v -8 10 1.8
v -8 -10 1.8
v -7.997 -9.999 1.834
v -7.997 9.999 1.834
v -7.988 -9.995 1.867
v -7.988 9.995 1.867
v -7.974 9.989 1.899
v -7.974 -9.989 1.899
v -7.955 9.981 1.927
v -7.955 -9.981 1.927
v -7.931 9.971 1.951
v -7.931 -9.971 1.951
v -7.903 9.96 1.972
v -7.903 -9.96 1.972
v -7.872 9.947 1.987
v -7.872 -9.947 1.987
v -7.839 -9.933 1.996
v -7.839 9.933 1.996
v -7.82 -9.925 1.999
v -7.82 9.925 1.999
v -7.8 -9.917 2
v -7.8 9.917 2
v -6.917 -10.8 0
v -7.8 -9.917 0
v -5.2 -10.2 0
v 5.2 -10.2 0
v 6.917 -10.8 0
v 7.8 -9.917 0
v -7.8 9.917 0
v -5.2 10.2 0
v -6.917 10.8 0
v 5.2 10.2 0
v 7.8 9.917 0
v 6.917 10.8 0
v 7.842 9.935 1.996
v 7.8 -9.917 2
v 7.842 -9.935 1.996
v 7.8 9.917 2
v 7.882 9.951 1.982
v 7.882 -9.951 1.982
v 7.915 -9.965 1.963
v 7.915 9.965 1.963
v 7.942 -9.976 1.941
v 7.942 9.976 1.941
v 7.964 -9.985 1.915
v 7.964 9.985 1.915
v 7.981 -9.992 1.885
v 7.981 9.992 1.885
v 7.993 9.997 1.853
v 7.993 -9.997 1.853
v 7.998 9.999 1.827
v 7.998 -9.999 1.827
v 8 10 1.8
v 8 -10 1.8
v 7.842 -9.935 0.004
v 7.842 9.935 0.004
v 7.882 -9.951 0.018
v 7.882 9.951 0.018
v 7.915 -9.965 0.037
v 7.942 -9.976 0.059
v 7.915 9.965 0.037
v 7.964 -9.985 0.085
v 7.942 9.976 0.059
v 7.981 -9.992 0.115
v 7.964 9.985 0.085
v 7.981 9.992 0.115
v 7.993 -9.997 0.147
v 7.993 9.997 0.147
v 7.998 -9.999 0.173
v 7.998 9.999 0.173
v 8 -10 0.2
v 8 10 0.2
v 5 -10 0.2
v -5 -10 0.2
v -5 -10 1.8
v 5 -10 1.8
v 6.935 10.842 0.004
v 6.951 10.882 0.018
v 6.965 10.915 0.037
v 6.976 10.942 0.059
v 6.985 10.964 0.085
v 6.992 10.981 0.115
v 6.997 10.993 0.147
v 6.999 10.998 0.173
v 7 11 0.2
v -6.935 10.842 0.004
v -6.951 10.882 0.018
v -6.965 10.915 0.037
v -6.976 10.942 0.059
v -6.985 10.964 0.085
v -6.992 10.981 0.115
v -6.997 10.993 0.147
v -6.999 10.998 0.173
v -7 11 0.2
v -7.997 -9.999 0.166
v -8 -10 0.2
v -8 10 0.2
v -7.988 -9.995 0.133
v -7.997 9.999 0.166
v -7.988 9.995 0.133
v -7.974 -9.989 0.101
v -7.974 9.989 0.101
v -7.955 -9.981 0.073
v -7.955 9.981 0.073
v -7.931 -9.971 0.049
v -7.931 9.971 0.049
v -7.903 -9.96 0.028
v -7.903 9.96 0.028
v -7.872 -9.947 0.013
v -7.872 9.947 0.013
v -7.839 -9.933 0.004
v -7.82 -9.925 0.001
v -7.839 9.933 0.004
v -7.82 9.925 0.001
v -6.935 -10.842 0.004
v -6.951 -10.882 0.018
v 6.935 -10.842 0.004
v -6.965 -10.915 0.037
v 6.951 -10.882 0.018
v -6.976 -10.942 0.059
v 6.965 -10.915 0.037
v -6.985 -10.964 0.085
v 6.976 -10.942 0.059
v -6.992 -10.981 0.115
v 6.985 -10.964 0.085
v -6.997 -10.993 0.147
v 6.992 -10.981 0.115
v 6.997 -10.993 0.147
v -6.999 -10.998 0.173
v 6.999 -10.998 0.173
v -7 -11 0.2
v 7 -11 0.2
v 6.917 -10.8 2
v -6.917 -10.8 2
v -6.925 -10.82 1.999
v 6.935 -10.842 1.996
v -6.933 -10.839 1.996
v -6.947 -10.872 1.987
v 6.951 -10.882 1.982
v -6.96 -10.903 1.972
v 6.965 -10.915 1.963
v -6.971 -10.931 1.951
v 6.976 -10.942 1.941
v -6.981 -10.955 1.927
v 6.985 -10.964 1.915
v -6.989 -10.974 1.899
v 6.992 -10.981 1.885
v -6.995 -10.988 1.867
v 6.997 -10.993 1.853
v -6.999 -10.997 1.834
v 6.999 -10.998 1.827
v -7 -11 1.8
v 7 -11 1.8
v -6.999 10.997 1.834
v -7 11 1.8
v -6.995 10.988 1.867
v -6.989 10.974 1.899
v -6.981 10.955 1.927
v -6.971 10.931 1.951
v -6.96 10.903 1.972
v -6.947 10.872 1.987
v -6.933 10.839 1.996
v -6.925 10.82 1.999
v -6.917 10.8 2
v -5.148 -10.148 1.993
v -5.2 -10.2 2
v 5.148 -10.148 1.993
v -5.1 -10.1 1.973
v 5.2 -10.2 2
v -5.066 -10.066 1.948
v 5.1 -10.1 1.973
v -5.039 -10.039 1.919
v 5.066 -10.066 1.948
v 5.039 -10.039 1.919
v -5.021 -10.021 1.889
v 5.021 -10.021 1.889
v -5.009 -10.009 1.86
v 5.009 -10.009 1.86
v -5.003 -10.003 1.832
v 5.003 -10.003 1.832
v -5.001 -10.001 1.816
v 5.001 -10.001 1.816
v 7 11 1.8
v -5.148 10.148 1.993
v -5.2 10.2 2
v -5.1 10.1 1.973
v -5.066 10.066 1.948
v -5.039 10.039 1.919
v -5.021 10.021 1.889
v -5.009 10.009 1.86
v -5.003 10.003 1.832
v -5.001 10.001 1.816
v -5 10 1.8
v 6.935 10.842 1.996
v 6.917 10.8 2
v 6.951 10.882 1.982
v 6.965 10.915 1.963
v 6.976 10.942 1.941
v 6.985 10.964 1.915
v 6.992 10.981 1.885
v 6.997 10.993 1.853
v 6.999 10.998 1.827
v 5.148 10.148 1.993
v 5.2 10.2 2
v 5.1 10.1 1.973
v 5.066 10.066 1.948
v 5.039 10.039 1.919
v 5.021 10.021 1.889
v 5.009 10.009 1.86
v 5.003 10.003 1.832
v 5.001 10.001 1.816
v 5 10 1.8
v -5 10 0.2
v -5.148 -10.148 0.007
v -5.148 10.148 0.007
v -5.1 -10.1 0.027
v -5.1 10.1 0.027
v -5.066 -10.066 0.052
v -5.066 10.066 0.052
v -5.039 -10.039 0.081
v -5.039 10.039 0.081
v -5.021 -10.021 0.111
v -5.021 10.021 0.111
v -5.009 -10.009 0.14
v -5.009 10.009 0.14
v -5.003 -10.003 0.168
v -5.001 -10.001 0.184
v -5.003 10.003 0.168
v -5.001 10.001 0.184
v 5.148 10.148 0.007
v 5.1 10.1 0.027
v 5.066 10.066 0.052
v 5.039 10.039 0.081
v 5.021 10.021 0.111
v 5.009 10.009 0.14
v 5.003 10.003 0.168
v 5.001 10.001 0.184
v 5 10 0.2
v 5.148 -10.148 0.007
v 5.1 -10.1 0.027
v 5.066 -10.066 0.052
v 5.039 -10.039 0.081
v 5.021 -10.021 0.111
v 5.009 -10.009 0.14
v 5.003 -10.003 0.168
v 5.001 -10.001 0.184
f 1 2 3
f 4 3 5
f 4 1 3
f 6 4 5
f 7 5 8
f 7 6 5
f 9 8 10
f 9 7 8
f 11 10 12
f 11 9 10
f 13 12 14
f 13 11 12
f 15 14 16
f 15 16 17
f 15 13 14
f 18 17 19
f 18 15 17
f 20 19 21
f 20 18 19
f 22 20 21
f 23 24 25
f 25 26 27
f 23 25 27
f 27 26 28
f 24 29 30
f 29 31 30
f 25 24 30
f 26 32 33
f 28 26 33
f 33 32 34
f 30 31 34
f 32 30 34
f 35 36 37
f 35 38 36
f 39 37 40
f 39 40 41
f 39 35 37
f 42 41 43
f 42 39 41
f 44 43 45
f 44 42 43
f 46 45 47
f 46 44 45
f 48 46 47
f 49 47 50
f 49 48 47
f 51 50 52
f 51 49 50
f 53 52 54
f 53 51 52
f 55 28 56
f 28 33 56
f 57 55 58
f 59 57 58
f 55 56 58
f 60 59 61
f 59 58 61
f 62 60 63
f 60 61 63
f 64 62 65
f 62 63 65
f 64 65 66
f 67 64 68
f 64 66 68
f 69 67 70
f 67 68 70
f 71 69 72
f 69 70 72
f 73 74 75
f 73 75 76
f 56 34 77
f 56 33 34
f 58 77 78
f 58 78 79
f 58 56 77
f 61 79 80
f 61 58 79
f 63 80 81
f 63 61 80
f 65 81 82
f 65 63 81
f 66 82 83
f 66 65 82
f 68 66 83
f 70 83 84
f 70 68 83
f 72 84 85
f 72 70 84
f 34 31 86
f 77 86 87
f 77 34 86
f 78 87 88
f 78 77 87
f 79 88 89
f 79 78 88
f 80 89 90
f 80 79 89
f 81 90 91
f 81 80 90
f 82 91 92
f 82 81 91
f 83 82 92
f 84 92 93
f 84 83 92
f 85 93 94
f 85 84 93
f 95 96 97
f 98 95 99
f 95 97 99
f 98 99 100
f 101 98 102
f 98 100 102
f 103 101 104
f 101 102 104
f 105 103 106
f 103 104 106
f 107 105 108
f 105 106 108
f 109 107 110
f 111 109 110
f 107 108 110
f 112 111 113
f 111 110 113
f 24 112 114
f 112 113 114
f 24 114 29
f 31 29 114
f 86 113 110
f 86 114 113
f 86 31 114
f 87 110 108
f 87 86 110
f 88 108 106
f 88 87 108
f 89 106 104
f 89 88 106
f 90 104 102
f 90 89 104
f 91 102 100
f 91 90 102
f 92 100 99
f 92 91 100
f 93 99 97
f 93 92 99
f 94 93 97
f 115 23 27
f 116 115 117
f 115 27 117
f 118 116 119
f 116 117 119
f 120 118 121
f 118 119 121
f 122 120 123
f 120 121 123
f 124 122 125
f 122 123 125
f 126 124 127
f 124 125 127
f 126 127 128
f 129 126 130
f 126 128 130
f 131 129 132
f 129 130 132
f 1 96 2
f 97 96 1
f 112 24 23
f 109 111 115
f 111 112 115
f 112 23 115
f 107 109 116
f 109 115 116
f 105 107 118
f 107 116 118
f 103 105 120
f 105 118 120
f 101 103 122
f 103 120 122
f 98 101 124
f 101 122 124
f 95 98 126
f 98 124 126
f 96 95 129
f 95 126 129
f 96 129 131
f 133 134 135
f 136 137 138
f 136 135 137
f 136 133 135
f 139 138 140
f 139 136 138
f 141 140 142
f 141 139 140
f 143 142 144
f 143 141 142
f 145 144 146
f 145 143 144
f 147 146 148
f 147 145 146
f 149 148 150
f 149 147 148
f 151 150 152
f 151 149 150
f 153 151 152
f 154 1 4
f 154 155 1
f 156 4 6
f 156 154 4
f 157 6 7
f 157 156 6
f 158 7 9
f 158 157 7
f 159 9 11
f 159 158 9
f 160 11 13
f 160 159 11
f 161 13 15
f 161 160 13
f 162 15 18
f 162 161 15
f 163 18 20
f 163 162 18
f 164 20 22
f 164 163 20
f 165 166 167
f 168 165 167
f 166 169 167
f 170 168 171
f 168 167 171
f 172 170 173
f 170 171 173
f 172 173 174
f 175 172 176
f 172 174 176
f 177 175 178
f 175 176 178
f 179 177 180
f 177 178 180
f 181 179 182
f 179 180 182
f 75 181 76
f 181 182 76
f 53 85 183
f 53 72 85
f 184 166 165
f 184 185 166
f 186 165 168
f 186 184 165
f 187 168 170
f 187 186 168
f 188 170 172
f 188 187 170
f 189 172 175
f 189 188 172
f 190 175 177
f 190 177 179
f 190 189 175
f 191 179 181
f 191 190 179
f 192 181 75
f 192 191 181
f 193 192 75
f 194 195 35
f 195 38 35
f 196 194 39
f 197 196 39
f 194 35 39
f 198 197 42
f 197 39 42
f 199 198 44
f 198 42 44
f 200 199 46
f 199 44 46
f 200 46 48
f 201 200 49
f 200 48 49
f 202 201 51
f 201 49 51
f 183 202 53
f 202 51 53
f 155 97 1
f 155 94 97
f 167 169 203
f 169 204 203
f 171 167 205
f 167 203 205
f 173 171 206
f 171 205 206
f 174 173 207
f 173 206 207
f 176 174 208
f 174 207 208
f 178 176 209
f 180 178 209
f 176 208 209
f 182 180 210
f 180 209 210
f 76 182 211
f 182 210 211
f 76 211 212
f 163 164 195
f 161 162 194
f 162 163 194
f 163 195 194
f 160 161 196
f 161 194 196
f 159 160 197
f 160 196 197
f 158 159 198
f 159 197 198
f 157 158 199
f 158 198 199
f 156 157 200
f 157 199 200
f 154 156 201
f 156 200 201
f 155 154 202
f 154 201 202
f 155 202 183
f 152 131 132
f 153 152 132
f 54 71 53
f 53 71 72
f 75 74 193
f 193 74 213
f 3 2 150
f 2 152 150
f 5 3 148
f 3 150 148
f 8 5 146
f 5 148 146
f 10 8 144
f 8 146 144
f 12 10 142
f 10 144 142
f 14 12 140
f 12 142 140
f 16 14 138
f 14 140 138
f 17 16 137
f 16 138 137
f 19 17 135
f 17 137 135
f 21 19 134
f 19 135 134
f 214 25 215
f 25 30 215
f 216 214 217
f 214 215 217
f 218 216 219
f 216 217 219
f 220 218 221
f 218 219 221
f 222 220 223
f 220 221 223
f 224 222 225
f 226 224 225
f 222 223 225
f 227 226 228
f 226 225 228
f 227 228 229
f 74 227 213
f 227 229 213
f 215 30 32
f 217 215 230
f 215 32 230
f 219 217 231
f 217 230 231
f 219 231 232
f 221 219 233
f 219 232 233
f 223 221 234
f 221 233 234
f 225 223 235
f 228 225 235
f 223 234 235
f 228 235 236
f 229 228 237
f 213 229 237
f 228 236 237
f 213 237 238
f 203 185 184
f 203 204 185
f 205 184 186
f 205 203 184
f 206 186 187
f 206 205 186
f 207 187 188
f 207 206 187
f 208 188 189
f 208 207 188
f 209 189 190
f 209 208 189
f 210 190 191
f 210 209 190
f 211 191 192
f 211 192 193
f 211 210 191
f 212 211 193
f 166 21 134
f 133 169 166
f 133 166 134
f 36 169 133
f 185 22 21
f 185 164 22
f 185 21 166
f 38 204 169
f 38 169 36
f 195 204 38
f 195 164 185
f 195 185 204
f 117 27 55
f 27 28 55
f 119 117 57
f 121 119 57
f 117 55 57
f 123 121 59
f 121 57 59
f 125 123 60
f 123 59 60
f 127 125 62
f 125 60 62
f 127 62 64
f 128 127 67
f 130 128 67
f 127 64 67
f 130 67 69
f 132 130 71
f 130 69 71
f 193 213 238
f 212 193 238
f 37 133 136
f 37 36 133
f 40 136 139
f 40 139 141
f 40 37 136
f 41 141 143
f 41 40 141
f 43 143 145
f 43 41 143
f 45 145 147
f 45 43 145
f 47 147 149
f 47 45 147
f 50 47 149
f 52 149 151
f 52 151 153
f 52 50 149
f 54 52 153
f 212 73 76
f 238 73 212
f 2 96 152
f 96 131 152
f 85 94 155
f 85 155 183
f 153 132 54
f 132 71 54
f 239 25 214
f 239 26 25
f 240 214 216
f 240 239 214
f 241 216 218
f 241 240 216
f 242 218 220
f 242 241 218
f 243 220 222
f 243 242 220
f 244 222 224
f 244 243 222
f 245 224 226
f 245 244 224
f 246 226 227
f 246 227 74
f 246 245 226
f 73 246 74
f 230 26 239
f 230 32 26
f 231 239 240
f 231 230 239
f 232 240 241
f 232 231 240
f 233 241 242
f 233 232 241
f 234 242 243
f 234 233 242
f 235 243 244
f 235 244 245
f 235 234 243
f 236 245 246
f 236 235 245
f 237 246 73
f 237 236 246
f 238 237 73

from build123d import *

# Parameters (mm, degrees)
F1_W     = 16
F1_H     = 22
F1_W_2   = 10
F1_H_2   = 20
F2_DEPTH = 2
F3_SIZE2 = 1
F3_SIZE  = 1
F4_SIZE2 = 1
F4_SIZE  = 1
F5_R     = 0.2


with BuildPart() as f2:
    # F1 (on face) → F2 (new body)
    with BuildSketch(Plane.XY):
        Rectangle(F1_W, F1_H)
        Rectangle(F1_W_2, F1_H_2, mode=Mode.SUBTRACT)
    extrude(amount=F2_DEPTH)

    # F3
    f3_edges = [f2.edges().sort_by_distance(p)[0] for p in [
        (-8, -11, 1),
    ]]
    chamfer(f3_edges, length=F3_SIZE, length2=F3_SIZE2)

    # F4
    f4_edges = [f2.edges().sort_by_distance(p)[0] for p in [
        (8, -11, 1),
        (8, 11, 1),
        (-8, 11, 1),
    ]]
    chamfer(f4_edges, length=F4_SIZE, length2=F4_SIZE2)

    # F5
    f5_edges = [f2.edges().sort_by_distance(p)[0] for p in [
        (-8, 0, 2),
        (-7.5, 10.5, 2),
        (-7.5, -10.5, 2),
        (0, 11, 2),
        (0, -11, 2),
        (7.5, 10.5, 2),
        (7.5, -10.5, 2),
        (8, 0, 2),
        (-5, 0, 2),
        (0, 10, 2),
        (5, 0, 2),
        (0, -10, 2),
        (-8, 0, 0),
        (-7.5, 10.5, 0),
        (-7.5, -10.5, 0),
        (0, 11, 0),
        (0, -11, 0),
        (7.5, 10.5, 0),
        (7.5, -10.5, 0),
        (8, 0, 0),
        (-5, 0, 0),
        (0, 10, 0),
        (5, 0, 0),
        (0, -10, 0),
    ]]
    fillet(f5_edges, radius=F5_R)


solid = f2.part
